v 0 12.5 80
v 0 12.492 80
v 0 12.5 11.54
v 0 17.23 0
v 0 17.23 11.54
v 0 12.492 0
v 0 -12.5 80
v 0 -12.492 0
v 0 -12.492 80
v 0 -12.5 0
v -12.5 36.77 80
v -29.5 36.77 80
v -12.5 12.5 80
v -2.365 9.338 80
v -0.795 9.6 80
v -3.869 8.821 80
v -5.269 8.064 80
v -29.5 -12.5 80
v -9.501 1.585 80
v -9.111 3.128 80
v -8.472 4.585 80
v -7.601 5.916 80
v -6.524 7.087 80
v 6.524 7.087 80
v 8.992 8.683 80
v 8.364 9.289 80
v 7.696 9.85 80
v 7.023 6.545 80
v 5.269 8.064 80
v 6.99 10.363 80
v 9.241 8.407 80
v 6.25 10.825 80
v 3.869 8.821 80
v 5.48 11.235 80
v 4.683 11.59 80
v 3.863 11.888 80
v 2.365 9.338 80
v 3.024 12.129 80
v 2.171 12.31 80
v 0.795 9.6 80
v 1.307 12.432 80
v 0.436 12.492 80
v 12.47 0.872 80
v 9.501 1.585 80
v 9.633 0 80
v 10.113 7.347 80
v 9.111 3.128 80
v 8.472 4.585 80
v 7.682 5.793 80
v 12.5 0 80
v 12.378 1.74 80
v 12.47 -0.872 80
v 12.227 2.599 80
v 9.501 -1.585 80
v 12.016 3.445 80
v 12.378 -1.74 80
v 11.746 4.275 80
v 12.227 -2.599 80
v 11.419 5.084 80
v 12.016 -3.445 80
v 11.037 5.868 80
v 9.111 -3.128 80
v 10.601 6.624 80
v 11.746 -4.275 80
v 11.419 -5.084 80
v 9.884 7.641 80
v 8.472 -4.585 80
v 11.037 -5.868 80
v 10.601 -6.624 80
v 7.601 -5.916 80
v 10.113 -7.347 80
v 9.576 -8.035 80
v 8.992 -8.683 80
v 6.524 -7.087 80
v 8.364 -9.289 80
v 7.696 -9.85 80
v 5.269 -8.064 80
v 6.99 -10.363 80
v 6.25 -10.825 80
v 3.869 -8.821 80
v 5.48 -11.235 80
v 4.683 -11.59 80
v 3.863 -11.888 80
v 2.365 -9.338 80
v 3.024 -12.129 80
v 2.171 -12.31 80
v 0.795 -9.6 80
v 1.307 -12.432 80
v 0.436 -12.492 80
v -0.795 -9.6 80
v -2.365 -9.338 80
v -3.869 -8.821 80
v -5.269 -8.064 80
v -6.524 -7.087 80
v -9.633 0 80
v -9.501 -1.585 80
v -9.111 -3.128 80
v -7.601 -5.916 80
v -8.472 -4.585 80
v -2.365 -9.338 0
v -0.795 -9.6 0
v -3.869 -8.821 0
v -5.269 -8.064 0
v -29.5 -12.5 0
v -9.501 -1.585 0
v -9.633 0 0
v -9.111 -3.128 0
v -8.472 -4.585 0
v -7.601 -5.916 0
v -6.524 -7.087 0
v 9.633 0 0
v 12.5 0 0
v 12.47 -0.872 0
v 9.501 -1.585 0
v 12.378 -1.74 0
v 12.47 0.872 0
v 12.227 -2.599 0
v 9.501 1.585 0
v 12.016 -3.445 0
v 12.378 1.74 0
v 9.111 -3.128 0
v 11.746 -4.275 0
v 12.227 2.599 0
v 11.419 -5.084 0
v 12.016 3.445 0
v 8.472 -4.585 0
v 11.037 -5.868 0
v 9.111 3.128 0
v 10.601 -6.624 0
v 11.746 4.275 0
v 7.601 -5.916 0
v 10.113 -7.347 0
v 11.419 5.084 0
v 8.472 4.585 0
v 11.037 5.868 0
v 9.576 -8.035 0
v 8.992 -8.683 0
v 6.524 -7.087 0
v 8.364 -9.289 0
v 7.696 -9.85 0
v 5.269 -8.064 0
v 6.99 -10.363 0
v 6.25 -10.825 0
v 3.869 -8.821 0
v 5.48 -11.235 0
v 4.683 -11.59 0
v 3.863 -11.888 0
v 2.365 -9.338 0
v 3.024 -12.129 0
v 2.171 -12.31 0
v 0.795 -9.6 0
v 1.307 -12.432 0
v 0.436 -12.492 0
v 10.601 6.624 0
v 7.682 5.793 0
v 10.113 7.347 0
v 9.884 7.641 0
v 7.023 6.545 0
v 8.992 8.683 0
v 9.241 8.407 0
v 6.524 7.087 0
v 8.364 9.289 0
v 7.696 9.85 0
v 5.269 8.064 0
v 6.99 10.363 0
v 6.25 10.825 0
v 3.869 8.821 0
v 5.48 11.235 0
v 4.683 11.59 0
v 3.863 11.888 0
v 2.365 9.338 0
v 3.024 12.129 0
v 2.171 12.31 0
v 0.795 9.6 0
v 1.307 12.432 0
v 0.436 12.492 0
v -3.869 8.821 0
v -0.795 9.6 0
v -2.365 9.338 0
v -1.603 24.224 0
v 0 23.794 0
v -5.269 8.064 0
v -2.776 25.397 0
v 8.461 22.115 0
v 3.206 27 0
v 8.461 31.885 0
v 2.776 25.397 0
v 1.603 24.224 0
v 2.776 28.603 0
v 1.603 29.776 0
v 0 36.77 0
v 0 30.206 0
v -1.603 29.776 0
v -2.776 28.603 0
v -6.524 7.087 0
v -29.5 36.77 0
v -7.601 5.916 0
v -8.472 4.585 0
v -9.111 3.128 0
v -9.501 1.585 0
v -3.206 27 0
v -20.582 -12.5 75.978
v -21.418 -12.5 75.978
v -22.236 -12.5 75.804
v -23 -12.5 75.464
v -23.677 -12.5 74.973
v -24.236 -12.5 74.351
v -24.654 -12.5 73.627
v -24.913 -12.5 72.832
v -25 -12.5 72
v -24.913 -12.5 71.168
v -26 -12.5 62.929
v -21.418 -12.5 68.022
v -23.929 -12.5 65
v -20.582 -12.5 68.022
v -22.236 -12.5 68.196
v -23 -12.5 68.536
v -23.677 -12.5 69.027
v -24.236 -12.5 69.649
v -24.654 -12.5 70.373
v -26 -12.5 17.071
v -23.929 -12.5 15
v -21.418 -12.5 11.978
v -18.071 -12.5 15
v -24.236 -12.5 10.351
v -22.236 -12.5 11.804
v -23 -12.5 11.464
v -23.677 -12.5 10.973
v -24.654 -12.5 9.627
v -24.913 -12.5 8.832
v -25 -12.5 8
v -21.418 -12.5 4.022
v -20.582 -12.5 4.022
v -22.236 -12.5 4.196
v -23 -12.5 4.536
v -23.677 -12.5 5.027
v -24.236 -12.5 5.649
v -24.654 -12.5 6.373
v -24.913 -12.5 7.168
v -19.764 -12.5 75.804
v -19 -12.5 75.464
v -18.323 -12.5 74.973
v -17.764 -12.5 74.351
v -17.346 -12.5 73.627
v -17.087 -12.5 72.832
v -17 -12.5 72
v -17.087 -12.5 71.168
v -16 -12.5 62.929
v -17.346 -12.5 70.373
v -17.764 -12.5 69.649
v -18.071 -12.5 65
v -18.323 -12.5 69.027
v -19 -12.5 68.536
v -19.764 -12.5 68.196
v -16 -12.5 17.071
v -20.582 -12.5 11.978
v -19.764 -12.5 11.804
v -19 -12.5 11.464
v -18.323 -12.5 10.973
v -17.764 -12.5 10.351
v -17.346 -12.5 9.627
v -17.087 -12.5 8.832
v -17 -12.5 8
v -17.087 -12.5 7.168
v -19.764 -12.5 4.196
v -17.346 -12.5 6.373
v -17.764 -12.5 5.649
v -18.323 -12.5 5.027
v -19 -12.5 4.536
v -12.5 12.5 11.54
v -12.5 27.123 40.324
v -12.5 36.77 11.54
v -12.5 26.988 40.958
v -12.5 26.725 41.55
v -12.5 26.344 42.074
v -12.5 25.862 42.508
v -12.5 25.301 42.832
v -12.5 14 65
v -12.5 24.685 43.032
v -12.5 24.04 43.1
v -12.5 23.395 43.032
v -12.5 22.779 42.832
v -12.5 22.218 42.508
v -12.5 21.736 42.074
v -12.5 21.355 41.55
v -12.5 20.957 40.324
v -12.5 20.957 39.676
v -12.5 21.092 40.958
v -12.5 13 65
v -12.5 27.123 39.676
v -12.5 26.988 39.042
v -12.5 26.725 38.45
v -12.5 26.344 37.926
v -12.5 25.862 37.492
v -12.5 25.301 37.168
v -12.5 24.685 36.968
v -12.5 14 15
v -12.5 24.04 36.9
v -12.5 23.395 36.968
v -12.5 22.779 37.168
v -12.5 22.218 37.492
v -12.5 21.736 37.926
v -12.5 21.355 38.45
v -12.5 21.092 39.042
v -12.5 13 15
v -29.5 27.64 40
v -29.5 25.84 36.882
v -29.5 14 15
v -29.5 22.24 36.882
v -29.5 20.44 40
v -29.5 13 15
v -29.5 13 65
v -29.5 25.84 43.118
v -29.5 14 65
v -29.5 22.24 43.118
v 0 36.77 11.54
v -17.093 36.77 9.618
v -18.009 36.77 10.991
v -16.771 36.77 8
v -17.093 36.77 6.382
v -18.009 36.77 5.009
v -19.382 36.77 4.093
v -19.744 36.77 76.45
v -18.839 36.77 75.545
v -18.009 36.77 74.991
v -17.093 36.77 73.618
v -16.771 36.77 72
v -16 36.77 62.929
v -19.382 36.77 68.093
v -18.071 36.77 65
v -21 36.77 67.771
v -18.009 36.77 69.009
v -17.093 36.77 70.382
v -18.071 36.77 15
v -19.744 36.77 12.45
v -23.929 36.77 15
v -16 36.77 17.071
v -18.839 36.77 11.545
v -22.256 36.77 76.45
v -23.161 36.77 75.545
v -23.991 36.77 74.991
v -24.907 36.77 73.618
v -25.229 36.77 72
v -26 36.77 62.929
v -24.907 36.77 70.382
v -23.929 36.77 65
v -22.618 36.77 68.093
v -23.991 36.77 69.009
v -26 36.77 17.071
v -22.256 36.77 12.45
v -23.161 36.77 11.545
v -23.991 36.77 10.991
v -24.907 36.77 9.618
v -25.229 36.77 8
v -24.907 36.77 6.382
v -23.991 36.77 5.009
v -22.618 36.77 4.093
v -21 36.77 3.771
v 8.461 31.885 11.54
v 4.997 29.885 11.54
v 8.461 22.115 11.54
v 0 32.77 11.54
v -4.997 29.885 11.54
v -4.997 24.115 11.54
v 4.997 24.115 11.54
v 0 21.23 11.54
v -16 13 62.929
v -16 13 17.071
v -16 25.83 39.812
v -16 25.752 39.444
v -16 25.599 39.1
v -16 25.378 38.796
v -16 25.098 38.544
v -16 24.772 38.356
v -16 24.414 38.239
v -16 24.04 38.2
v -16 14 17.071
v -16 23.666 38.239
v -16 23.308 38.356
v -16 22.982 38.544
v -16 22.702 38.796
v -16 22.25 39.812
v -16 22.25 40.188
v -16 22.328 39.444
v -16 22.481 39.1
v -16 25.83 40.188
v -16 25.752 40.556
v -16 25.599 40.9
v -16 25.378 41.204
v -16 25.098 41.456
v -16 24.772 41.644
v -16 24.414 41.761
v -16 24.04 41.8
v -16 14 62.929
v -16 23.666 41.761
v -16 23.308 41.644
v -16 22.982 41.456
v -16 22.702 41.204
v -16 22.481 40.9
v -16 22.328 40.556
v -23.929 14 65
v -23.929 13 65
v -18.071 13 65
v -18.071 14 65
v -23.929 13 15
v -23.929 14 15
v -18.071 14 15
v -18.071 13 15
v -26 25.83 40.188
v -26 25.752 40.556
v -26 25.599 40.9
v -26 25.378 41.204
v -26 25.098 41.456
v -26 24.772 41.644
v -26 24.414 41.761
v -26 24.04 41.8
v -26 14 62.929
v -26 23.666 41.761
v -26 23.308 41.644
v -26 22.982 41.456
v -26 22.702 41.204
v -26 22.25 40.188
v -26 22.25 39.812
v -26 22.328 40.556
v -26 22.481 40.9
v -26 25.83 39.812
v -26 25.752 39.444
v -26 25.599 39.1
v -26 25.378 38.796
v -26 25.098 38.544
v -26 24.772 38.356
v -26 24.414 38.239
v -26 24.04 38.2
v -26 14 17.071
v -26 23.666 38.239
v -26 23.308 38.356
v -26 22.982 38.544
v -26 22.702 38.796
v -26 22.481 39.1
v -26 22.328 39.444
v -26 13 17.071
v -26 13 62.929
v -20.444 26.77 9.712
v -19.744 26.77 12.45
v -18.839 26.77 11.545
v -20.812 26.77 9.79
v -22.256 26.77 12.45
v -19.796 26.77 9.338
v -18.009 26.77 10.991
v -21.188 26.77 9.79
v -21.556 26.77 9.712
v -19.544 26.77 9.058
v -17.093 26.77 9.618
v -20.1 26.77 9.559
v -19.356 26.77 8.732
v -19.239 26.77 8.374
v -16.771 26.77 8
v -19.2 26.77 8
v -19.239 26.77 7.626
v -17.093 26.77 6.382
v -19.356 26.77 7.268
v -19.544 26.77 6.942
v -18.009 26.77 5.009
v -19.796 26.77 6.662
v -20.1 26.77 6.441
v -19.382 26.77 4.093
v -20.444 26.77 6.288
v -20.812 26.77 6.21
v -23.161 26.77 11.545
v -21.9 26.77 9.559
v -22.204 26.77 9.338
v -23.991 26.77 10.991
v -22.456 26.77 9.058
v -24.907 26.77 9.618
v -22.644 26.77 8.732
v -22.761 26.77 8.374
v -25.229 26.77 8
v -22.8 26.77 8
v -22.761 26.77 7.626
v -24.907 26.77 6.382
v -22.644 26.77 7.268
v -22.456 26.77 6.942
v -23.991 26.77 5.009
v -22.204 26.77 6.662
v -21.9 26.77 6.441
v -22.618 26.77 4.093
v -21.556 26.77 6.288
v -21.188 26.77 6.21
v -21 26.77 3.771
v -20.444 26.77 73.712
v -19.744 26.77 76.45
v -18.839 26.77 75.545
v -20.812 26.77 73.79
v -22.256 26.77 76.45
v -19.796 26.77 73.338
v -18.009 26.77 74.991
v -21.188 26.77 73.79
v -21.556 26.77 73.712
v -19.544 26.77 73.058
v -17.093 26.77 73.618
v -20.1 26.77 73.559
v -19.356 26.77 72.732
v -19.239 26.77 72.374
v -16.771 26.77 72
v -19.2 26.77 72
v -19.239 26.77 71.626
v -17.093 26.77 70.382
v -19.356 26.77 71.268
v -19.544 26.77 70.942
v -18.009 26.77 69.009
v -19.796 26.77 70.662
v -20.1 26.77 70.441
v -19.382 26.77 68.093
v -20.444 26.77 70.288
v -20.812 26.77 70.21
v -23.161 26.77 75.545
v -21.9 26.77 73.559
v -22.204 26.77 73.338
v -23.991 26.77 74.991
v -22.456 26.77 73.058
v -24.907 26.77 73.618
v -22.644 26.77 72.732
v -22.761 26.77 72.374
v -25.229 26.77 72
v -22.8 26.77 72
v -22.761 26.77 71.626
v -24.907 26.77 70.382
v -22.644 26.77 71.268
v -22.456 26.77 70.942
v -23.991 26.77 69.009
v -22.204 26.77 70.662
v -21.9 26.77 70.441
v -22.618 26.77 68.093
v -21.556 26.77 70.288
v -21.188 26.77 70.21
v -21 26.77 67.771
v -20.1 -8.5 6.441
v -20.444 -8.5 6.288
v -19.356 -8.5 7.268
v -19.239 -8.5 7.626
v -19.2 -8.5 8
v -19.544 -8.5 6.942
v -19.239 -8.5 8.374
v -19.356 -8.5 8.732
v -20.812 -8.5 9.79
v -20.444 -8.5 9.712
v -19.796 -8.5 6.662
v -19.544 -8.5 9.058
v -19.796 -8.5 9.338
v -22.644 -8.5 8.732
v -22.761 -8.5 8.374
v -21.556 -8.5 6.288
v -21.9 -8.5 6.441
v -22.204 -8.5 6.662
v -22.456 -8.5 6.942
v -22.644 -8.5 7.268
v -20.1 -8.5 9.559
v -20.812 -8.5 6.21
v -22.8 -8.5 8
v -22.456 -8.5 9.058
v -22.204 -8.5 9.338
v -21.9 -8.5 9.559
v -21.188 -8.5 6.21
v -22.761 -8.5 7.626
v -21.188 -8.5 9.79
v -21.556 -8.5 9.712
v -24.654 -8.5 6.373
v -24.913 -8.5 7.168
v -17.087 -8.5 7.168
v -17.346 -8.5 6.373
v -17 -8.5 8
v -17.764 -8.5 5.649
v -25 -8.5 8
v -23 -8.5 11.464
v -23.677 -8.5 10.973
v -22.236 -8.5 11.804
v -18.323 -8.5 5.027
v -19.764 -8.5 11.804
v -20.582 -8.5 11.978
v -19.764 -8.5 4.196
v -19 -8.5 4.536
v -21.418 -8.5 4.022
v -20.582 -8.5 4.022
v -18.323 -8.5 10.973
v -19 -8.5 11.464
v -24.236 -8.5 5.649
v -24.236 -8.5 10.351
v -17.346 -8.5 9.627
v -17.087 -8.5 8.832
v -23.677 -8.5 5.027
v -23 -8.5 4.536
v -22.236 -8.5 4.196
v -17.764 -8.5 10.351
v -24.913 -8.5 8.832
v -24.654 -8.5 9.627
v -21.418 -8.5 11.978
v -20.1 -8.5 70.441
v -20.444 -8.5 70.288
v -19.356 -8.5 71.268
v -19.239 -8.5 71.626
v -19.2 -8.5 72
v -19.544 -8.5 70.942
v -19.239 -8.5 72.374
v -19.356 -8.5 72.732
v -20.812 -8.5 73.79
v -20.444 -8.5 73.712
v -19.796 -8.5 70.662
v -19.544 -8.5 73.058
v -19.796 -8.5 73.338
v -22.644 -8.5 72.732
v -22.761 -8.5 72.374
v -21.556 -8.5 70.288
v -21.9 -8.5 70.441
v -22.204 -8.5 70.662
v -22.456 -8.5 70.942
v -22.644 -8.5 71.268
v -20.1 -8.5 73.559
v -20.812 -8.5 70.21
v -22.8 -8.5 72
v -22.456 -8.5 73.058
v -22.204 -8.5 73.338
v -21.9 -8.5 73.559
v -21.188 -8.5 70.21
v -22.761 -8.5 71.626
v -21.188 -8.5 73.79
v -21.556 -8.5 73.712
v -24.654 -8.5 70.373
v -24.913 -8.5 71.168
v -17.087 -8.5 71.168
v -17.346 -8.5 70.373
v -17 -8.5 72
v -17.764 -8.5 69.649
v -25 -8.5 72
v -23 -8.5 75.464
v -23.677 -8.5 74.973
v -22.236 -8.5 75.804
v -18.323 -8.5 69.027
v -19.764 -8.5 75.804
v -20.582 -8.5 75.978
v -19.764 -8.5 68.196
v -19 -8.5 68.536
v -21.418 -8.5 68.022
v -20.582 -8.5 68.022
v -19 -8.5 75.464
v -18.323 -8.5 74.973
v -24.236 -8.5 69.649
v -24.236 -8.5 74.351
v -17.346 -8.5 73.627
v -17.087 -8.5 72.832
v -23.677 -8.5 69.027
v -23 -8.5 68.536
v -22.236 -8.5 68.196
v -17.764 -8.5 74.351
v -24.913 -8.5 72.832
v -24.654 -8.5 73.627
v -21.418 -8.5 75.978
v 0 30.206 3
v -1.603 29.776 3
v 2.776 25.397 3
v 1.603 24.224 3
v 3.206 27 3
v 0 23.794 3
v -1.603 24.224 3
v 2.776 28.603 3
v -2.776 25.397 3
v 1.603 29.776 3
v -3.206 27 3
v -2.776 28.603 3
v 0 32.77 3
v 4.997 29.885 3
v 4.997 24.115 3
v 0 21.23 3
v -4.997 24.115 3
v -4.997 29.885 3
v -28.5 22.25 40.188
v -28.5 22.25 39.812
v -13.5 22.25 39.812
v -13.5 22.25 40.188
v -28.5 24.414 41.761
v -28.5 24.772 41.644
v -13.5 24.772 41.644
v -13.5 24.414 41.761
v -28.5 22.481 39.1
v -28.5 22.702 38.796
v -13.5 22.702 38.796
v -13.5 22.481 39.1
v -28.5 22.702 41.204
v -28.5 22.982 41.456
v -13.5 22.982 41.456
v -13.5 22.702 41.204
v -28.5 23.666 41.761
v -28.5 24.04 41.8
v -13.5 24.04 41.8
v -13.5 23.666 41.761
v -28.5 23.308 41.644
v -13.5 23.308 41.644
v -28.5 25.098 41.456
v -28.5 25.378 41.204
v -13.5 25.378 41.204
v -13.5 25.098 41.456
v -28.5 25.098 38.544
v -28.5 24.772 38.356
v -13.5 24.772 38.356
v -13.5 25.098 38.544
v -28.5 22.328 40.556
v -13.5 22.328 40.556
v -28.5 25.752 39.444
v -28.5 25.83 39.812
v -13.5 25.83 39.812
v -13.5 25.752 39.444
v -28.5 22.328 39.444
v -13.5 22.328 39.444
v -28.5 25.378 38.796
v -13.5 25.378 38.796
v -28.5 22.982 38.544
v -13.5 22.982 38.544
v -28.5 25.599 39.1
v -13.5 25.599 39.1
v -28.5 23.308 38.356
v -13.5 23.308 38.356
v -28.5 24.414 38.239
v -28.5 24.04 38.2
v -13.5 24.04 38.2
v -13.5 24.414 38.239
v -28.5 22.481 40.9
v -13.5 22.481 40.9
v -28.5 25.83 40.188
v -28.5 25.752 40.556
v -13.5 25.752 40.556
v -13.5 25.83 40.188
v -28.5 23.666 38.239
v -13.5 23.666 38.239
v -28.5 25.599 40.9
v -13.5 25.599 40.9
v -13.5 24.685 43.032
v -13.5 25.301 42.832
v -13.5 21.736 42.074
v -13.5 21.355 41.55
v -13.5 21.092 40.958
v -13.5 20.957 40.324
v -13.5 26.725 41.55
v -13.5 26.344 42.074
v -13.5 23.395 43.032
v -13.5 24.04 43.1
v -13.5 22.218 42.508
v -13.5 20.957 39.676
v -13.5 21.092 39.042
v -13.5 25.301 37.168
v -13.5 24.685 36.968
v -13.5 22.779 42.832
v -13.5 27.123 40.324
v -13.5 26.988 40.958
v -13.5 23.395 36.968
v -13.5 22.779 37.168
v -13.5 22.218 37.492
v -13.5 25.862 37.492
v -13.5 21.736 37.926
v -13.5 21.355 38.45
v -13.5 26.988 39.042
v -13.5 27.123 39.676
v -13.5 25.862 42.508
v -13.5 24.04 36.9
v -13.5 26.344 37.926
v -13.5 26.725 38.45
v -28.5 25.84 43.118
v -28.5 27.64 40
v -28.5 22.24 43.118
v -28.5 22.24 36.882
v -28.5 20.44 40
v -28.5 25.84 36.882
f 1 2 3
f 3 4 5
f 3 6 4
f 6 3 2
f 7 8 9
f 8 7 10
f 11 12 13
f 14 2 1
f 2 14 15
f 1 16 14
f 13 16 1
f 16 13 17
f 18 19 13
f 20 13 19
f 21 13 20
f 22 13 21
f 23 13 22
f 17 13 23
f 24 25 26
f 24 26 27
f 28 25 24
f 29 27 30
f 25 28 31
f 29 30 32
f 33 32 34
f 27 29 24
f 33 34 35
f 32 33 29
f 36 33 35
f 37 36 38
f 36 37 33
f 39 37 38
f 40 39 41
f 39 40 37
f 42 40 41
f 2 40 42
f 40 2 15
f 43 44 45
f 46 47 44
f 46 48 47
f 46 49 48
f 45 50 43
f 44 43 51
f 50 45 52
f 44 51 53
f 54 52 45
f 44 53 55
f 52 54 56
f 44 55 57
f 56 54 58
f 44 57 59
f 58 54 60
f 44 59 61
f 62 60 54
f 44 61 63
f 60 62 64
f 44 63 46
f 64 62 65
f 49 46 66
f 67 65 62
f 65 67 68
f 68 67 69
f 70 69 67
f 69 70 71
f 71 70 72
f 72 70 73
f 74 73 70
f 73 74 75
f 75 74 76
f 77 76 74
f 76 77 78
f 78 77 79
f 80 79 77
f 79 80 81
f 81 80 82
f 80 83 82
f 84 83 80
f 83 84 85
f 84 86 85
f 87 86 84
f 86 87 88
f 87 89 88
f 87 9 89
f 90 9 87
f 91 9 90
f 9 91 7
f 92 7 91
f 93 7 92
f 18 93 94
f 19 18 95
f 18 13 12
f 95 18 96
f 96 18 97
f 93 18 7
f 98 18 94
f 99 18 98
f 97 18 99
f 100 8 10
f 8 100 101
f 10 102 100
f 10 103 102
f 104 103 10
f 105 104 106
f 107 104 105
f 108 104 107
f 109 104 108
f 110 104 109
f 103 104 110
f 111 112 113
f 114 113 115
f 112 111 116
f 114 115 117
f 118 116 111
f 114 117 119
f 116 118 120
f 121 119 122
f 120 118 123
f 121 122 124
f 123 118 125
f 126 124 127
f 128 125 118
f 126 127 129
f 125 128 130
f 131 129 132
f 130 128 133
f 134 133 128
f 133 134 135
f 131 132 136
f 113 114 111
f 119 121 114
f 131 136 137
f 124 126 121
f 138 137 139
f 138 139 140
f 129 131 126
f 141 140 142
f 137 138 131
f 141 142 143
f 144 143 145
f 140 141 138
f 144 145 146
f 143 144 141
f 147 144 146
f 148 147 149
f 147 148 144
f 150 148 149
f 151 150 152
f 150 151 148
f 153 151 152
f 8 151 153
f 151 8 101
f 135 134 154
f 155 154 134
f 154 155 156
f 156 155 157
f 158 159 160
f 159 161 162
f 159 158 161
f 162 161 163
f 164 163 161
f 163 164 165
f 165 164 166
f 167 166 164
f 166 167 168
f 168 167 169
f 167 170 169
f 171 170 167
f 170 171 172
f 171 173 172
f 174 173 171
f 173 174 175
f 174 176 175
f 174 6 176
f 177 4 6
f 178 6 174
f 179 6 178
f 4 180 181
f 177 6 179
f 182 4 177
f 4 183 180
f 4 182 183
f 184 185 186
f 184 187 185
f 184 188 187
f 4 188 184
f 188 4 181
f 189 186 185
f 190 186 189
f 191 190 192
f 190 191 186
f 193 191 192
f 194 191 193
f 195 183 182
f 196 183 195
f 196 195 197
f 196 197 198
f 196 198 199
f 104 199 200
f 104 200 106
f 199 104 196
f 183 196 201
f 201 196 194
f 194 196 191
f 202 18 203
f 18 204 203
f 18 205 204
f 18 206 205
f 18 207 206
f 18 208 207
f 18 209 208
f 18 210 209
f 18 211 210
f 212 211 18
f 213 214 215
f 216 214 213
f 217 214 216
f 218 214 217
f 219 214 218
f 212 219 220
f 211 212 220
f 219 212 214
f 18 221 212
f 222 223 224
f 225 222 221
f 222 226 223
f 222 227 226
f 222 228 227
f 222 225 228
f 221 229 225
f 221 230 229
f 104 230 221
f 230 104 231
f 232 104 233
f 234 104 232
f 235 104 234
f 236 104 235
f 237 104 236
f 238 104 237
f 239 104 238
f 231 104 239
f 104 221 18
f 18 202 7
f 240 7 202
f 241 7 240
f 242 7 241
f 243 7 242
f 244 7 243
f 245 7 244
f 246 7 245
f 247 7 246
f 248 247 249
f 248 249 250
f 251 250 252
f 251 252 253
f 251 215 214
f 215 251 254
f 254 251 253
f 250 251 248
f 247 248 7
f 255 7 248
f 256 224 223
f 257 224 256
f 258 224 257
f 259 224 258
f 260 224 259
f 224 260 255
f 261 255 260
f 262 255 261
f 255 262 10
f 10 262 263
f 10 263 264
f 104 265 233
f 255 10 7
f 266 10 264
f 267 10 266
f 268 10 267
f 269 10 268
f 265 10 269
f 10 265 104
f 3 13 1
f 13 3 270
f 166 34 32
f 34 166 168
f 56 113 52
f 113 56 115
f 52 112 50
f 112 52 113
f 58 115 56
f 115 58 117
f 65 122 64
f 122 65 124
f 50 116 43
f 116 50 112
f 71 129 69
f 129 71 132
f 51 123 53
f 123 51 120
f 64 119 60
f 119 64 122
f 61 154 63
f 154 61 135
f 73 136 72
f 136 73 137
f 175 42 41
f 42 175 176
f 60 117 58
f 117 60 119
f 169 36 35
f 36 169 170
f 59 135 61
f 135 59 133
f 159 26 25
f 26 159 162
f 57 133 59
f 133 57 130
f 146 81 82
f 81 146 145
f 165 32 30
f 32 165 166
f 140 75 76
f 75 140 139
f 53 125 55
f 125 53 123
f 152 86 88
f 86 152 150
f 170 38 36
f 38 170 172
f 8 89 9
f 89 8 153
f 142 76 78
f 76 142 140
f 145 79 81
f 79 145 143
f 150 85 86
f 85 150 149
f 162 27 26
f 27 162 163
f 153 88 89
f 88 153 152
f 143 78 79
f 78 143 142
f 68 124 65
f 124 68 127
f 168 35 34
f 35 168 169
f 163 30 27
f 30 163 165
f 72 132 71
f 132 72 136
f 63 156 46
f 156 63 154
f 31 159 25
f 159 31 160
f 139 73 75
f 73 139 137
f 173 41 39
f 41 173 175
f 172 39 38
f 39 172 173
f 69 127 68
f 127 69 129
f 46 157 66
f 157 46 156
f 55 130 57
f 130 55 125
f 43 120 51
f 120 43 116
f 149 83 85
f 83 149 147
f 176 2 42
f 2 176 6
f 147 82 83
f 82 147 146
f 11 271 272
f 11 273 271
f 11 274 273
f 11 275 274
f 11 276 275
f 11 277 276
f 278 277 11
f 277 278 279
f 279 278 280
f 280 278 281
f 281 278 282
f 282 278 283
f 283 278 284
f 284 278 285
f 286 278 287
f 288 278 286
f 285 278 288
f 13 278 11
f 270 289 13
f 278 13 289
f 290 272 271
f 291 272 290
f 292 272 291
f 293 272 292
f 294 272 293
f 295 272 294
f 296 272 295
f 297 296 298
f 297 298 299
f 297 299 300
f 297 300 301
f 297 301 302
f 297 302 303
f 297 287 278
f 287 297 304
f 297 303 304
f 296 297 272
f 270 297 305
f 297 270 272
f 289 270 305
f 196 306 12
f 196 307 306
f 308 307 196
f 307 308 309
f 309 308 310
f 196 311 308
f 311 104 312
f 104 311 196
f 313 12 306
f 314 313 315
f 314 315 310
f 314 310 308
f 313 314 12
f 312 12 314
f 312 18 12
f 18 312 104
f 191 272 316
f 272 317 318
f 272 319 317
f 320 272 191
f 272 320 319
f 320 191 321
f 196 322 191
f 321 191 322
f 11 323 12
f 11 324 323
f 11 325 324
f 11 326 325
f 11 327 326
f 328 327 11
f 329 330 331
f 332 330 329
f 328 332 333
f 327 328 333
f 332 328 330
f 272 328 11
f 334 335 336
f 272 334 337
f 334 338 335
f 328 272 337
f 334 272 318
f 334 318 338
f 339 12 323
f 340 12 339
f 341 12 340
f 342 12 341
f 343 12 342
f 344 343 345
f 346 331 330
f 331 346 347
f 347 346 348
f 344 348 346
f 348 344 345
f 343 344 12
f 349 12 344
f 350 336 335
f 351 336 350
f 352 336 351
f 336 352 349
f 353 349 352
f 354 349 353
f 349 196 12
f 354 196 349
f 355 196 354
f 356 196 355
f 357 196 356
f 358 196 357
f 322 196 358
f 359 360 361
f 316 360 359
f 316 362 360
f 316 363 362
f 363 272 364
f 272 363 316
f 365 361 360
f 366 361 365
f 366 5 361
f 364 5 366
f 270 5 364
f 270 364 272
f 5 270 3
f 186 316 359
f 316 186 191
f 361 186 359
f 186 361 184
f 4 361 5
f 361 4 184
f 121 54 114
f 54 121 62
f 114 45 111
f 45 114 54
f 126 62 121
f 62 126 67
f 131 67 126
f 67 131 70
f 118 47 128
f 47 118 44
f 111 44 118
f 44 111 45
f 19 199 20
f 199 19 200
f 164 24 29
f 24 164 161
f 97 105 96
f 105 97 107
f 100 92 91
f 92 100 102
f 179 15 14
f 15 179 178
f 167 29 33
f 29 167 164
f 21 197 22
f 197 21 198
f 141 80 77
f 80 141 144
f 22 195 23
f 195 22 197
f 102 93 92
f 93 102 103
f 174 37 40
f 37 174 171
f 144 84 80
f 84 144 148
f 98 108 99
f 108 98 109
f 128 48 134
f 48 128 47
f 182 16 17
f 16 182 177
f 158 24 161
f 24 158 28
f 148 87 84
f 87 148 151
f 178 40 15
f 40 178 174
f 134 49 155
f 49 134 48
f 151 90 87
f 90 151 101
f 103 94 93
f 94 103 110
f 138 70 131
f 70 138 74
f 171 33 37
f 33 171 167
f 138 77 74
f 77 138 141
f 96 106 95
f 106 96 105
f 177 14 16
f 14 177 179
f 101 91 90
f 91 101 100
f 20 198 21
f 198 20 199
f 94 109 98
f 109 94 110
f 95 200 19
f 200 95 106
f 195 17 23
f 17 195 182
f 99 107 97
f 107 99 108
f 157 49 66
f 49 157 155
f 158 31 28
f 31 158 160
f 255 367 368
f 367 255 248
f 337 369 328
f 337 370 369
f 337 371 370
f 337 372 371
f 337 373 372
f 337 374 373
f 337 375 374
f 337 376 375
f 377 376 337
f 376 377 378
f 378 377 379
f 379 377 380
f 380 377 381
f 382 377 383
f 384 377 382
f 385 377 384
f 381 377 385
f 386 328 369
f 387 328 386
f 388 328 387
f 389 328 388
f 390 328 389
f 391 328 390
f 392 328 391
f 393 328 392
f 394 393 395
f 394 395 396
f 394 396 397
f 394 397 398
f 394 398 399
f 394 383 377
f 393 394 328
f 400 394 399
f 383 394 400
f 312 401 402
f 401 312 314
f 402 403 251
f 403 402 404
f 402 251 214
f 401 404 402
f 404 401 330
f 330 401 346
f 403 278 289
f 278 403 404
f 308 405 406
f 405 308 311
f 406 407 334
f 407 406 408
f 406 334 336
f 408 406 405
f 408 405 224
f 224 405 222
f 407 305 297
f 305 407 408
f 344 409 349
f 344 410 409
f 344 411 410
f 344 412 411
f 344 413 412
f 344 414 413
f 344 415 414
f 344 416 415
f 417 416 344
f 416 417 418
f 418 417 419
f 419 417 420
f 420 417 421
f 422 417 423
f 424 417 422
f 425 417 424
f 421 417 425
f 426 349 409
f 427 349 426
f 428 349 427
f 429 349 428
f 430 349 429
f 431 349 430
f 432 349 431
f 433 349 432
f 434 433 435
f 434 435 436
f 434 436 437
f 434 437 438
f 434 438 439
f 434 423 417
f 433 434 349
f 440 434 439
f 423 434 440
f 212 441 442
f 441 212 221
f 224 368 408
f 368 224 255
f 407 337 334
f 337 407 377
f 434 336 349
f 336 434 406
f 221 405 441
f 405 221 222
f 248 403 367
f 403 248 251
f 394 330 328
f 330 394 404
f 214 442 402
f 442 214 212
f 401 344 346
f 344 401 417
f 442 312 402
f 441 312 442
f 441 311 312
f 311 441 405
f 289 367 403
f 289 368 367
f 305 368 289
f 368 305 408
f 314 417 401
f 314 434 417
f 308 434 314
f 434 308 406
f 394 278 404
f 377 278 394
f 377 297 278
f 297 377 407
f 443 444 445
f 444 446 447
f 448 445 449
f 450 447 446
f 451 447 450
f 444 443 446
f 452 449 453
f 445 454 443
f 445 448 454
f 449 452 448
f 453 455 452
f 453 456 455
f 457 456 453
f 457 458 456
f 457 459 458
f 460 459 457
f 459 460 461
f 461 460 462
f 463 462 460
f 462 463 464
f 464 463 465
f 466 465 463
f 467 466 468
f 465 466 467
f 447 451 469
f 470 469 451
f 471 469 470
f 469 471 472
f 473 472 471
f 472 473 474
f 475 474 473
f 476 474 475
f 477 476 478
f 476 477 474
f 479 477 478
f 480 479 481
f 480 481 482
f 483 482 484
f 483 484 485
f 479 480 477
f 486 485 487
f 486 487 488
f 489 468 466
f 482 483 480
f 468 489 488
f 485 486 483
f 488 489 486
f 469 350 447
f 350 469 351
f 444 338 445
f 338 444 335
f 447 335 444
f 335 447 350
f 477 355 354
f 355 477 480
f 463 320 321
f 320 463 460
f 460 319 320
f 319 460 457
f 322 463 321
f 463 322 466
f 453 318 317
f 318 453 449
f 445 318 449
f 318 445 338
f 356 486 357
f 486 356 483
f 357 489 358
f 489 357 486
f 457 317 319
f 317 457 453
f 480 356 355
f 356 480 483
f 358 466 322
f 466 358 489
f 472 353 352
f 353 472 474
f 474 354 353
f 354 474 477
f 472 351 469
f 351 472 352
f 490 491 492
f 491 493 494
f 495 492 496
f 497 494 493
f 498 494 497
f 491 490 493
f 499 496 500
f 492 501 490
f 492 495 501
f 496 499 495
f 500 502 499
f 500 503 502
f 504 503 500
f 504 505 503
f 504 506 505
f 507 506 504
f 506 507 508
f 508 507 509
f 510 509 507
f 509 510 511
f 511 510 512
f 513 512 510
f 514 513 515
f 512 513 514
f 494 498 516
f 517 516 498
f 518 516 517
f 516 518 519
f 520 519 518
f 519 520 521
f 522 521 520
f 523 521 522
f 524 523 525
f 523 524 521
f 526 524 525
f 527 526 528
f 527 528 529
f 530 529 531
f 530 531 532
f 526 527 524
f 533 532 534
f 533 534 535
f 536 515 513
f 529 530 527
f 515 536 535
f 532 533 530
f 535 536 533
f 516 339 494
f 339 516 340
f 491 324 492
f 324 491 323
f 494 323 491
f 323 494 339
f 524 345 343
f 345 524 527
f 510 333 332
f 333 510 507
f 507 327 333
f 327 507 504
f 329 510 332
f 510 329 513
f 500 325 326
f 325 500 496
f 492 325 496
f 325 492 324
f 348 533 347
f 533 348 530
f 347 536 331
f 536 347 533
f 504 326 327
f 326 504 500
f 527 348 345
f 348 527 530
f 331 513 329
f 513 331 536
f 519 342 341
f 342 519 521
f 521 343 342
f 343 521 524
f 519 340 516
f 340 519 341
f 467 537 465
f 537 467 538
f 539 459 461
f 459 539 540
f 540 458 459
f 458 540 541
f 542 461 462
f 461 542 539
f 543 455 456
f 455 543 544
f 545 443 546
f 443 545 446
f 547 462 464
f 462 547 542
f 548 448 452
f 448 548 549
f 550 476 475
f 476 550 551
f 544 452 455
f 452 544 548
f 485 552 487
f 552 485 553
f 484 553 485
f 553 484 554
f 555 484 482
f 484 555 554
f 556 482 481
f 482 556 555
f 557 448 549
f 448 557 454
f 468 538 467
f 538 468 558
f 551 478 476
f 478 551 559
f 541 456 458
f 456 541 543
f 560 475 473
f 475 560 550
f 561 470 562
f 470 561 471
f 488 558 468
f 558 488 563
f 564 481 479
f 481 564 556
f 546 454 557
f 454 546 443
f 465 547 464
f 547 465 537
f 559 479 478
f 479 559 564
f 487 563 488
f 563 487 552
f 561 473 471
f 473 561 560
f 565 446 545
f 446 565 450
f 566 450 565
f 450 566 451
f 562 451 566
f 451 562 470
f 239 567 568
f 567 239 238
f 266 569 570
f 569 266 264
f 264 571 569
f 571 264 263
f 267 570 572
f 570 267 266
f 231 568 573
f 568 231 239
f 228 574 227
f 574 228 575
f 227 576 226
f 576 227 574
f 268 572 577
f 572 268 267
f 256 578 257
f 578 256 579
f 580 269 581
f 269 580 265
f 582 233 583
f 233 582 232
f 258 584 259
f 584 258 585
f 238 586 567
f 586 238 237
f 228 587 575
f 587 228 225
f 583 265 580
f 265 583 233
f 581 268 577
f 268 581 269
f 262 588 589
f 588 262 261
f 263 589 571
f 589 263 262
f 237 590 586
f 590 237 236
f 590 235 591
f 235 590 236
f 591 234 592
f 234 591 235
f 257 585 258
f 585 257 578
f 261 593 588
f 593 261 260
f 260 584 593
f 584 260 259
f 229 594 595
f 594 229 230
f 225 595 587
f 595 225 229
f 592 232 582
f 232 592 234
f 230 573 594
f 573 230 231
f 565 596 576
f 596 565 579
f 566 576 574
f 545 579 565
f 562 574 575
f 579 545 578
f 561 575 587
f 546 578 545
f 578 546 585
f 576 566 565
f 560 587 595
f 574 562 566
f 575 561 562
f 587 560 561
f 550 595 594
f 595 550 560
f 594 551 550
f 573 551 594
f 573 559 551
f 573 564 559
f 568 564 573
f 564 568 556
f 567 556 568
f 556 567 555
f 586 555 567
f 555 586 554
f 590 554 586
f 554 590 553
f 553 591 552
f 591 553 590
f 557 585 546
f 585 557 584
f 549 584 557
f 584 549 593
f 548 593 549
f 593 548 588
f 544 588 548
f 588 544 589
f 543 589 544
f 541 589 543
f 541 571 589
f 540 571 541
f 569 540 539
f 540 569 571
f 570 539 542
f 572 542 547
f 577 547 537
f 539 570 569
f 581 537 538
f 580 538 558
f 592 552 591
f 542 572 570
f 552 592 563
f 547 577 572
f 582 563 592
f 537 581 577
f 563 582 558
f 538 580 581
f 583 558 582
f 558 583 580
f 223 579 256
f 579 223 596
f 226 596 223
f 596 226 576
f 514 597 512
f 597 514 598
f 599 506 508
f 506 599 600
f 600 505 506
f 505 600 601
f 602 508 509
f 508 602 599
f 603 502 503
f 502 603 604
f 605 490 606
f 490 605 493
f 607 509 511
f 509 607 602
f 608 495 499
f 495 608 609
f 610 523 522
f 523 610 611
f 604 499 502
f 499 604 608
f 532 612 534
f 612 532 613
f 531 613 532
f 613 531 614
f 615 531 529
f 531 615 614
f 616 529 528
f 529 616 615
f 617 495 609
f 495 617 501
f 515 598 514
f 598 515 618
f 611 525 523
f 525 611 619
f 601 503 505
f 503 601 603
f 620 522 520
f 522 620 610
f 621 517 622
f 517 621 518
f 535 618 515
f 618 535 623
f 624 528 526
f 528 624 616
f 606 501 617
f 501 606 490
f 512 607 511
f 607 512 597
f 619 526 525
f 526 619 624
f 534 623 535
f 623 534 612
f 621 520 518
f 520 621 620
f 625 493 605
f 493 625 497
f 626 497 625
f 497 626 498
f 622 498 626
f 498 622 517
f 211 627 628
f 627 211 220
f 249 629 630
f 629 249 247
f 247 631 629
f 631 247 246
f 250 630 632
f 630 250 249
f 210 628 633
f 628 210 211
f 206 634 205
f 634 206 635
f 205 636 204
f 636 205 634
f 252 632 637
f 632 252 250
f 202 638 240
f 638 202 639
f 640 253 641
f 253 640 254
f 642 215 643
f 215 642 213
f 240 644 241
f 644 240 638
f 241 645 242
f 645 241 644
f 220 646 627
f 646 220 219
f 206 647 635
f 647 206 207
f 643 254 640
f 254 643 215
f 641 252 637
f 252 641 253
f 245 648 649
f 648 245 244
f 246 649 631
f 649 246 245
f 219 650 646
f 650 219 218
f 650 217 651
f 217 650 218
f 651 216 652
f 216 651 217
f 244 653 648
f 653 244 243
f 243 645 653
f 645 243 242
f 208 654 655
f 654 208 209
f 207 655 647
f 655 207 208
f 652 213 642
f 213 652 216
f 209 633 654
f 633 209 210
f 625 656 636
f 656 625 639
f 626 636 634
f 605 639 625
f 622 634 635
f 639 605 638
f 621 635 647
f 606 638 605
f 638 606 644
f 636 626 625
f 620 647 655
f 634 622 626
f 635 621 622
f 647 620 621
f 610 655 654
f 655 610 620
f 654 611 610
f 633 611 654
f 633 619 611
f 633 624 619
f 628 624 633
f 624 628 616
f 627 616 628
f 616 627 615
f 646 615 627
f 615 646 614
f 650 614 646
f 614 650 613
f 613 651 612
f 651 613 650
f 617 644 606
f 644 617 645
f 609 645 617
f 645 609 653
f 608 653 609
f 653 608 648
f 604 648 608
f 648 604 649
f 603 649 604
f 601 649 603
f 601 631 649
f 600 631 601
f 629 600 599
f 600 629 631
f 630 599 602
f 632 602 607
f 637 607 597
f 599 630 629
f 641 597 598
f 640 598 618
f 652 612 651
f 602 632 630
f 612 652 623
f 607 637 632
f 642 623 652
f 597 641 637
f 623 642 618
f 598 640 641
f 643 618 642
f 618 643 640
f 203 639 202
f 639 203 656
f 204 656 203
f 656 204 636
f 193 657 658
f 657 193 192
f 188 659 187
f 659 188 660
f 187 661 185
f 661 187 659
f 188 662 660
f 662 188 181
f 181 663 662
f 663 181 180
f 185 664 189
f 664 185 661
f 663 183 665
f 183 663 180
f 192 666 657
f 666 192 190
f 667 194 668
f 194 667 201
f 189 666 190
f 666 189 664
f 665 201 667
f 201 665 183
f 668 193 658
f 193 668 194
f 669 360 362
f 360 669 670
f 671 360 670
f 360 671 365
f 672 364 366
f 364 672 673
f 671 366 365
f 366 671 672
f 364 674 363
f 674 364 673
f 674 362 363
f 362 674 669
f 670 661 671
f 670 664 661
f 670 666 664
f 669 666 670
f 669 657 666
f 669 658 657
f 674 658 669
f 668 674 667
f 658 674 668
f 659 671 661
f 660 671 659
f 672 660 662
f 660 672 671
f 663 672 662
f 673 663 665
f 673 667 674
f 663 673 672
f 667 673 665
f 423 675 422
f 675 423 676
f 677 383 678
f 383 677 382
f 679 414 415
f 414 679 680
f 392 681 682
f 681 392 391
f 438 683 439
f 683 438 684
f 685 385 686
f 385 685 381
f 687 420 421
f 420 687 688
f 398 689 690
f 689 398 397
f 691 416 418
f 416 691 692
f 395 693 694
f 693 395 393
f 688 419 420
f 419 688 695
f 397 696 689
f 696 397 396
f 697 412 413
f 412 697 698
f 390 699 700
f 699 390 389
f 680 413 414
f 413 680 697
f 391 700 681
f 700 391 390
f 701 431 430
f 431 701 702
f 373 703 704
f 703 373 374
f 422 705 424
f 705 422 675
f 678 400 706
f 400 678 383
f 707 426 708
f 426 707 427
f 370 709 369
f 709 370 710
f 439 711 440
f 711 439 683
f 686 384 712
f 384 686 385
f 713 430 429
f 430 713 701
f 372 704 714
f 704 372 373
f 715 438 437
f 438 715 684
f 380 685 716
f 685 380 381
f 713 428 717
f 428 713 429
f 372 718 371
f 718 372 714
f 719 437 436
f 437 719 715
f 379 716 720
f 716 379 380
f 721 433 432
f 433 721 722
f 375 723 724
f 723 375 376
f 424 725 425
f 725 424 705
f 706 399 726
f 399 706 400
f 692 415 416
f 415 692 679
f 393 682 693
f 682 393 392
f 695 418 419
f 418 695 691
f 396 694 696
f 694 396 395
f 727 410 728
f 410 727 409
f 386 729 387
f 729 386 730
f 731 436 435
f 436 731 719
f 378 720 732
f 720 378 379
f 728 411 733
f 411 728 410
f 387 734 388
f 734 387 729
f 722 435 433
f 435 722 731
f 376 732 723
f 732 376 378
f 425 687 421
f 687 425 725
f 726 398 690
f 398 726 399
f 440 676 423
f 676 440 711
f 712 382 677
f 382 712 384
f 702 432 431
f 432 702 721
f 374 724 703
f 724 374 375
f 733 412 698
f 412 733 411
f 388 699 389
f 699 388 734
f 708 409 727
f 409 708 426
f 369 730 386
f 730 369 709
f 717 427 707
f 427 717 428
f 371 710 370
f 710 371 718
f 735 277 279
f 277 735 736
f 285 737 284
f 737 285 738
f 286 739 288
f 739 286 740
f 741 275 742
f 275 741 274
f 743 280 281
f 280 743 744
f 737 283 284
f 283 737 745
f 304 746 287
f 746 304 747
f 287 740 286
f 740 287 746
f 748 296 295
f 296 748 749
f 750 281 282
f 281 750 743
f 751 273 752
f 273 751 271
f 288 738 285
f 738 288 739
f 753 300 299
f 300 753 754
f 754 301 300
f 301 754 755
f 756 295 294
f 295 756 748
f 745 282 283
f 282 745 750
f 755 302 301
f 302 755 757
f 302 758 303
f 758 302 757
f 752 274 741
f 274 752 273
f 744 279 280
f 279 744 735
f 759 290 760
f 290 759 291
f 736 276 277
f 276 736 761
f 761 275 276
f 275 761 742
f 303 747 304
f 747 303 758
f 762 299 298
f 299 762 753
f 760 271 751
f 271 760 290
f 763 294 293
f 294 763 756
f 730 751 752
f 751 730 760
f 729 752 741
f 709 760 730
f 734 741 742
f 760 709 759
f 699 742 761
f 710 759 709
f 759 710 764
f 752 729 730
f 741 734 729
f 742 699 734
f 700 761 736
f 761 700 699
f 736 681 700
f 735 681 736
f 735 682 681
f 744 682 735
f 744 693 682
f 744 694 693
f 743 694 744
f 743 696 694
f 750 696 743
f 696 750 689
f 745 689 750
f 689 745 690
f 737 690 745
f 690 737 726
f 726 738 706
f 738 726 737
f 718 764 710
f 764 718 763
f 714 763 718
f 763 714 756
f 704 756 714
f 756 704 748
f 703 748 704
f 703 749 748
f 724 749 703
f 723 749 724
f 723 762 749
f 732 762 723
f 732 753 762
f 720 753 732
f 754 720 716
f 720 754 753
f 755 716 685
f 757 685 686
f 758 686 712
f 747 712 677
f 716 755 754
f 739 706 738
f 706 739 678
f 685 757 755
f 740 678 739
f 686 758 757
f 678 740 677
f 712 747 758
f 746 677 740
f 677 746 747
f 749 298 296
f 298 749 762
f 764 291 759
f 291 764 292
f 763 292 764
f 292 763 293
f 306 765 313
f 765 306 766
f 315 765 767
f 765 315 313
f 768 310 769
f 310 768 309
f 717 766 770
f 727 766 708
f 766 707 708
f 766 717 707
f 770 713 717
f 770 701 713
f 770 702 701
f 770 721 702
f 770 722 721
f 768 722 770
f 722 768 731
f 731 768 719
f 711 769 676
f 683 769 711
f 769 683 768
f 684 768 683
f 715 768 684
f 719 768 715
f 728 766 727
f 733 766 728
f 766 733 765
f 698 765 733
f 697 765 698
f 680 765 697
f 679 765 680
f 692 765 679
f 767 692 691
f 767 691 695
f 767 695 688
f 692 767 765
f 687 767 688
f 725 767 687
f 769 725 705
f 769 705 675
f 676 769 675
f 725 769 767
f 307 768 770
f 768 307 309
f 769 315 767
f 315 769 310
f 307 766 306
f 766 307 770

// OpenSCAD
// file: polyholes.scad
// MK2Clone r2
// based on Mendel90
//
// GNU GPL v2
// nop.head@gmail.com
// hydraraptor.blogspot.com
//
// See http://hydraraptor.blogspot.com/2011/02/polyholes.html
//
function sides(r) = max(round(4 *r),3);
function correctedRadius(r,n) = 0.1 + r / cos(180 / n);
function correctedDiameter(d) = 0.2 + d / cos(180 / sides(d / 2));

module polyCircle(r, center = false) {
    n = sides(r);
    circle(r = correctedRadius(r,n), $fn = n, center = center);
}

module poly_circle(r, center = false) {
	polyCircle(r, center);
}

module polyCylinder(r, h, center = false) {
    n = sides(r);
    cylinder(h = h, r = correctedRadius(r,n), $fn = n, center = center);
}

module poly_cylinder(r, h, center = false) {
	polyCylinder(r,h,center);
}

module polydCylinder(r, center = false) {
    n = sides(r);
    r = correctedRadius(r,n);
    cylinder(h = h, r = r, $fn = n, center = center);
    translate([0, -r, 0])
        cube([r, 2 * r, h]);
}

module poly_d_cylinder(r, center = false) {
	polydCylinder(r,center);
}
// file: bearing.scad
// PRUSA iteration3
// Bearing holders
// GNU GPL v3
// Josef Průša <iam@josefprusa.cz> and contributors
// http://www.reprap.org/wiki/Prusa_Mendel
// http://prusamendel.org
// S. Stefanov 2021
// all configurations moved to file config.scad
include <config.scad>
use <polyholes.scad>


module horizontal_bearing_base(bearings=1){
 translate(v=[0,0,6]) cube(size = [24,8+bearings*25,12], center = true);	
}

module horizontal_bearing_holes(bearings=1){
 cutter_lenght = 10+bearings*25;
 one_holder_lenght = 8+25;
 holder_lenght = 8+bearings*25;
 
 // Main bearing cut
 difference(){
  translate(v=[0,0,12]) rotate(a=[90,0,0]) translate(v=[0,0,-cutter_lenght/2]) cylinder(h = cutter_lenght, r=bearing_diameter/2, $fn=50);
  // Bearing retainers
  translate(v=[0,1-holder_lenght/2,3]) cube(size = [24,6,8], center = true);
  translate(v=[0,-1+holder_lenght/2,3]) cube(size = [24,6,8], center = true);
 }
 
 // Ziptie cutouts
 for ( i = [0 : bearings-1] ){
  // For easier positioning I move them by half of one 
  // bearing holder then add each bearign lenght and then center again
  translate(v=[0,-holder_lenght/2,0]) translate(v=[0,one_holder_lenght/2+i*25,0]) difference(){
   union(){
    translate(v=[0,2-6,12]) rotate(a=[90,0,0]) translate(v=[0,0,0]) cylinder(h = 4, r=12.5, $fn=50);
    translate(v=[0,2+6,12]) rotate(a=[90,0,0]) translate(v=[0,0,0]) cylinder(h = 4, r=12.5, $fn=50);
   }
   translate(v=[0,10,12]) rotate(a=[90,0,0]) translate(v=[0,0,0]) cylinder(h = 24, r=10, $fn=50);
  }
 }
 
}

module horizontal_bearing_test(){
 difference(){
  horizontal_bearing_base(1);
  horizontal_bearing_holes(1);
 }
 translate(v=[(bearing_height+2)/2,0,0]) difference(){
  horizontal_bearing_base(2);
  horizontal_bearing_holes(2);
 }
 translate(v=[bearing_height+2,0,0]) difference(){
  horizontal_bearing_base(3);
  horizontal_bearing_holes(3);
 }
}

module vertical_bearing_base(){
 translate(v=[-1-bearing_size/4,0,bearing_height/2]) cube(size = [2+bearing_size/2,bearing_size,bearing_height], center = true);
 cylinder(h = bearing_height, r=bearing_size/2, $fn = 90);
}

module vertical_bearing_holes(){
  translate(v=[0,0,-1]) poly_cylinder(h = bearing_height+4, r=bearing_diameter/2);
  rotate(a=[0,0,-40]) translate(v=[bearing_diameter/2-1,-0.5,-1]) cube(size = [thinwall*2,1,bearing_height+4]);

}

difference(){
vertical_bearing_base();
vertical_bearing_holes();
}
// file: x-end.scad
// PRUSA iteration3
// X end prototype
// GNU GPL v3
// Josef Průša <iam@josefprusa.cz> and contributors
// http://www.reprap.org/wiki/Prusa_Mendel
// http://prusamendel.org

// S. Stefanov 2021
// all configurations moved to file config.scad
include <config.scad>

use <bearing.scad>
use <polyholes.scad>

module x_end_base(){
// Main block
    translate(v=[x_rod_center,-((x_block_depth-bearing_size)/2),x_end_base_height/2]) cube(size = [x_block_width,x_block_depth,x_end_base_height], center = true);
// Bearing holder
    vertical_bearing_base();	
//Nut trap
 // Cube
    x_cube_width = z_rod_to_screw_distance+x_hex_size/2+4-bearing_size/2;
    translate(v=[-bearing_size/4,-2-(z_rod_to_screw_distance+x_hex_size/2+2-x_cube_width/2),x_hex_size/2]) cube(size = [bearing_size/2,x_cube_width,x_hex_size], center = true);
 // Hexagon
    translate(v=[0,-(z_rod_to_screw_distance),0]) rotate([0,0,30]) cylinder(h = x_hex_size, r=x_hex_size/2+4, $fn = 6);
}

module x_end_holes(rod_hole_depth = x_block_depth-6){
    // rod_hole_depth = 4-x_block_depth+bearing_size/2;
//    rod_hole_depth = x_block_depth-10;
    rod_hole2_depth = x_block_depth - rod_hole_depth;
    vertical_bearing_holes();
// Belt hole
    translate(v=[0,0,0]){
// Stress relief
        translate(v=[x_rod_center,-bearing_size/2-1,x_end_base_height/2]) cube(size = [x_block_width+1,1,x_rod_distance - x_rod_diameter - 6], center = true);
            difference(){
                translate(v=[x_rod_center,-(0.05+x_block_depth-bearing_size)/2,x_end_base_height/2]) cube(size = [x_hole_width,x_block_depth+0.1,x_hole_height], center = true);

	// Nice edges
            edge_offset = 2;
            translate(v=[-edge_offset+7+x_rod_center+x_hole_width/2,-10,(x_end_base_height-x_hole_height)/2]) rotate([0,45,0]) cube(size = [10,x_block_depth+20,28], center = true);
            translate(v=[edge_offset-7+x_rod_center-x_hole_width/2,-10,(x_end_base_height-x_hole_height)/2]) rotate([0,-45,0]) cube(size = [10,x_block_depth+20,28], center = true);
            translate(v=[-edge_offset+7+x_rod_center+x_hole_width/2,-10,(x_end_base_height+x_hole_height)/2]) rotate([0,-45,0]) cube(size = [10,x_block_depth+20,28], center = true);
            translate(v=[edge_offset-7+x_rod_center-x_hole_width/2,-10,(x_end_base_height+x_hole_height)/2]) rotate([0,45,0]) cube(size = [10,x_block_depth+20,28], center = true);

//                translate(v=[x_rod_center+cube_width/2,-10,cube_height/2+23]) rotate([0,45,0]) cube(size = [10,46,28], center = true);
//    	        translate(v=[x_rod_center+5.5,-10,30+23]) rotate([0,-45,0]) cube(size = [10,46,28], center = true);
    //	        translate(v=[-5.5-10+1.5,-10,30-23]) rotate([0,45,0]) cube(size = [10,46,28], center = true);
    //	        translate(v=[-5.5-10+1.5,-10,30-23]) rotate([0,-45,0]) cube(size = [10,46,28], center = true);

            }
        }

// Bottom pushfit rod
    translate(v=[x_rod_center,-1-(x_block_depth-bearing_size/2),(x_end_base_height-x_rod_distance)/2]) rotate(a=[-90,0,0]) pushfit_rod(x_rod_diameter + 0.1,rod_hole_depth+1);
    translate(v=[x_rod_center,-1+bearing_size/2-rod_hole2_depth,(x_end_base_height-x_rod_distance)/2]) rotate(a=[-90,0,0]) cylinder(h = rod_hole2_depth+200, r=1.8, $fn=30);
    translate(v=[x_rod_center,-4+bearing_size/2,(x_end_base_height-x_rod_distance)/2]) rotate(a=[-90,0,0]) cylinder(h = 200, r=4, $fn=30);   

// Top pushfit rod
    translate(v=[x_rod_center,-1-(x_block_depth-bearing_size/2),(x_end_base_height+x_rod_distance)/2]) rotate(a=[-90,0,0]) pushfit_rod(x_rod_diameter + 0.1,rod_hole_depth+1);
    translate(v=[x_rod_center,-1+bearing_size/2-rod_hole2_depth,(x_end_base_height+x_rod_distance)/2]) rotate(a=[-90,0,0]) cylinder(h = rod_hole2_depth+200, r=1.8, $fn=30);     
    translate(v=[x_rod_center,-4+bearing_size/2,(x_end_base_height+x_rod_distance)/2]) rotate(a=[-90,0,0]) cylinder(h = 200, r=4, $fn=30);   

// Nut trap
    translate(v=[0,-(z_rod_to_screw_distance),-0.5]) poly_cylinder(h = 4, r=x_hex_diameter/2, $fn=25);
    translate(v=[0,-(z_rod_to_screw_distance),3]) rotate([0,0,30]) cylinder(h = 10, r=x_hex_size/2, $fn = 6);
}


// Final prototype
module x_end_plain(){
 difference(){
  x_end_base();
  x_end_holes();
 }
}

x_end_plain();
//rod_hole_depth = x_block_depth-4;
rod_hole_depth = x_block_depth-10;
rod_hole2_depth = x_block_depth - rod_hole_depth;


module pushfit_rod(diameter,length){
 poly_cylinder(h = length, r=diameter/2);
 difference(){
 	translate(v=[0,-diameter/2.85,length/2]) rotate([0,0,45]) cube(size = [diameter/2,diameter/2,length], center = true);
 	translate(v=[0,-diameter/4-diameter/2-0.4,length/2]) rotate([0,0,0]) cube(size = [diameter,diameter/2,length], center = true);
 }
 //translate(v=[0,-diameter/2-2,length/2]) cube(size = [diameter,1,length], center = true);
}
// file: config.scad
// configurations

//bearing.scad
thinwall = 3;
bearing_diameter = 19;
bearing_size = bearing_diameter + 2 * thinwall;
ziptie_cut_ofset = 0;

// y
z_rod_to_screw_distance = 27;

// end-idler
//x_rod_diameter = 10 ;

//x-end.scad
x_rod_diameter = 8 ;
x_rod_distance = 64; // 45
x_end_base_height = x_rod_distance + 8 + x_rod_diameter; //68;
// r = x * 2 / sqrt(3) = x * 1.154
x_hex_size = 10 * 1.154;
x_hex_diameter = 6;
x_block_width = x_rod_diameter + 9;
x_rod_center = -((bearing_size+x_block_width)/2);
x_hole_width = 10;
if (x_rod_diameter>10) { 
    x_hole_width = x_rod_diameter ;
};
x_hole_height = x_rod_distance - x_rod_diameter - 6 ;
x_block_depth = bearing_size/2 + z_rod_to_screw_distance + x_hex_size/2+4;


//bearing.scad
bearing_height = x_end_base_height; // 58
// main file
// PRUSA iteration3
// X end idler
// GNU GPL v3
// Josef Průša <iam@josefprusa.cz> and contributors
// http://www.reprap.org/wiki/Prusa_Mendel
// http://prusamendel.org

// S. Stefanov 2021
// all configurations moved to file config.scad
include <config.scad>
use <x-end.scad>

module x_end_idler_base(){
 x_end_base();
}

module x_end_idler_holes(){
    rod_hole_depth = 10;
    x_end_holes(rod_hole_depth);
    translate(v=[0,-(x_hex_size+bearing_size/2),x_end_base_height/2]) rotate(a=[0,-90,0]) cylinder(h = 80, r=1.8, $fn=30);
// translate(v=[0,-22,x_end_base_height/2]) rotate(a=[0,-90,0]) cylinder(h = 80, r=1.8, $fn=30);
    translate(v=[-1,-(x_hex_size+bearing_size/2),x_end_base_height/2]) rotate(a=[0,-90,0]) cylinder(h = bearing_size/2, r=3.1, $fn=30);
    translate(v=[-(x_block_width-1+bearing_size/2),-(x_hex_size+bearing_size/2),x_end_base_height/2]) rotate(a=[0,-90,0]) rotate(a=[0,0,30]) cylinder(h = 80, r=3.6, $fn=6);
// translate(v=[-x_block_width,-(x_hex_size+bearing_size/2),x_end_base_height/2]) rotate(a=[0,-90,0]) rotate(a=[0,0,30]) cylinder(h = 80, r=3.6, $fn=6);
}
 
// Final part
module x_end_idler(){
 mirror([0,1,0]) difference(){
  x_end_idler_base();
  x_end_idler_holes();
 }
}

x_end_idler();
